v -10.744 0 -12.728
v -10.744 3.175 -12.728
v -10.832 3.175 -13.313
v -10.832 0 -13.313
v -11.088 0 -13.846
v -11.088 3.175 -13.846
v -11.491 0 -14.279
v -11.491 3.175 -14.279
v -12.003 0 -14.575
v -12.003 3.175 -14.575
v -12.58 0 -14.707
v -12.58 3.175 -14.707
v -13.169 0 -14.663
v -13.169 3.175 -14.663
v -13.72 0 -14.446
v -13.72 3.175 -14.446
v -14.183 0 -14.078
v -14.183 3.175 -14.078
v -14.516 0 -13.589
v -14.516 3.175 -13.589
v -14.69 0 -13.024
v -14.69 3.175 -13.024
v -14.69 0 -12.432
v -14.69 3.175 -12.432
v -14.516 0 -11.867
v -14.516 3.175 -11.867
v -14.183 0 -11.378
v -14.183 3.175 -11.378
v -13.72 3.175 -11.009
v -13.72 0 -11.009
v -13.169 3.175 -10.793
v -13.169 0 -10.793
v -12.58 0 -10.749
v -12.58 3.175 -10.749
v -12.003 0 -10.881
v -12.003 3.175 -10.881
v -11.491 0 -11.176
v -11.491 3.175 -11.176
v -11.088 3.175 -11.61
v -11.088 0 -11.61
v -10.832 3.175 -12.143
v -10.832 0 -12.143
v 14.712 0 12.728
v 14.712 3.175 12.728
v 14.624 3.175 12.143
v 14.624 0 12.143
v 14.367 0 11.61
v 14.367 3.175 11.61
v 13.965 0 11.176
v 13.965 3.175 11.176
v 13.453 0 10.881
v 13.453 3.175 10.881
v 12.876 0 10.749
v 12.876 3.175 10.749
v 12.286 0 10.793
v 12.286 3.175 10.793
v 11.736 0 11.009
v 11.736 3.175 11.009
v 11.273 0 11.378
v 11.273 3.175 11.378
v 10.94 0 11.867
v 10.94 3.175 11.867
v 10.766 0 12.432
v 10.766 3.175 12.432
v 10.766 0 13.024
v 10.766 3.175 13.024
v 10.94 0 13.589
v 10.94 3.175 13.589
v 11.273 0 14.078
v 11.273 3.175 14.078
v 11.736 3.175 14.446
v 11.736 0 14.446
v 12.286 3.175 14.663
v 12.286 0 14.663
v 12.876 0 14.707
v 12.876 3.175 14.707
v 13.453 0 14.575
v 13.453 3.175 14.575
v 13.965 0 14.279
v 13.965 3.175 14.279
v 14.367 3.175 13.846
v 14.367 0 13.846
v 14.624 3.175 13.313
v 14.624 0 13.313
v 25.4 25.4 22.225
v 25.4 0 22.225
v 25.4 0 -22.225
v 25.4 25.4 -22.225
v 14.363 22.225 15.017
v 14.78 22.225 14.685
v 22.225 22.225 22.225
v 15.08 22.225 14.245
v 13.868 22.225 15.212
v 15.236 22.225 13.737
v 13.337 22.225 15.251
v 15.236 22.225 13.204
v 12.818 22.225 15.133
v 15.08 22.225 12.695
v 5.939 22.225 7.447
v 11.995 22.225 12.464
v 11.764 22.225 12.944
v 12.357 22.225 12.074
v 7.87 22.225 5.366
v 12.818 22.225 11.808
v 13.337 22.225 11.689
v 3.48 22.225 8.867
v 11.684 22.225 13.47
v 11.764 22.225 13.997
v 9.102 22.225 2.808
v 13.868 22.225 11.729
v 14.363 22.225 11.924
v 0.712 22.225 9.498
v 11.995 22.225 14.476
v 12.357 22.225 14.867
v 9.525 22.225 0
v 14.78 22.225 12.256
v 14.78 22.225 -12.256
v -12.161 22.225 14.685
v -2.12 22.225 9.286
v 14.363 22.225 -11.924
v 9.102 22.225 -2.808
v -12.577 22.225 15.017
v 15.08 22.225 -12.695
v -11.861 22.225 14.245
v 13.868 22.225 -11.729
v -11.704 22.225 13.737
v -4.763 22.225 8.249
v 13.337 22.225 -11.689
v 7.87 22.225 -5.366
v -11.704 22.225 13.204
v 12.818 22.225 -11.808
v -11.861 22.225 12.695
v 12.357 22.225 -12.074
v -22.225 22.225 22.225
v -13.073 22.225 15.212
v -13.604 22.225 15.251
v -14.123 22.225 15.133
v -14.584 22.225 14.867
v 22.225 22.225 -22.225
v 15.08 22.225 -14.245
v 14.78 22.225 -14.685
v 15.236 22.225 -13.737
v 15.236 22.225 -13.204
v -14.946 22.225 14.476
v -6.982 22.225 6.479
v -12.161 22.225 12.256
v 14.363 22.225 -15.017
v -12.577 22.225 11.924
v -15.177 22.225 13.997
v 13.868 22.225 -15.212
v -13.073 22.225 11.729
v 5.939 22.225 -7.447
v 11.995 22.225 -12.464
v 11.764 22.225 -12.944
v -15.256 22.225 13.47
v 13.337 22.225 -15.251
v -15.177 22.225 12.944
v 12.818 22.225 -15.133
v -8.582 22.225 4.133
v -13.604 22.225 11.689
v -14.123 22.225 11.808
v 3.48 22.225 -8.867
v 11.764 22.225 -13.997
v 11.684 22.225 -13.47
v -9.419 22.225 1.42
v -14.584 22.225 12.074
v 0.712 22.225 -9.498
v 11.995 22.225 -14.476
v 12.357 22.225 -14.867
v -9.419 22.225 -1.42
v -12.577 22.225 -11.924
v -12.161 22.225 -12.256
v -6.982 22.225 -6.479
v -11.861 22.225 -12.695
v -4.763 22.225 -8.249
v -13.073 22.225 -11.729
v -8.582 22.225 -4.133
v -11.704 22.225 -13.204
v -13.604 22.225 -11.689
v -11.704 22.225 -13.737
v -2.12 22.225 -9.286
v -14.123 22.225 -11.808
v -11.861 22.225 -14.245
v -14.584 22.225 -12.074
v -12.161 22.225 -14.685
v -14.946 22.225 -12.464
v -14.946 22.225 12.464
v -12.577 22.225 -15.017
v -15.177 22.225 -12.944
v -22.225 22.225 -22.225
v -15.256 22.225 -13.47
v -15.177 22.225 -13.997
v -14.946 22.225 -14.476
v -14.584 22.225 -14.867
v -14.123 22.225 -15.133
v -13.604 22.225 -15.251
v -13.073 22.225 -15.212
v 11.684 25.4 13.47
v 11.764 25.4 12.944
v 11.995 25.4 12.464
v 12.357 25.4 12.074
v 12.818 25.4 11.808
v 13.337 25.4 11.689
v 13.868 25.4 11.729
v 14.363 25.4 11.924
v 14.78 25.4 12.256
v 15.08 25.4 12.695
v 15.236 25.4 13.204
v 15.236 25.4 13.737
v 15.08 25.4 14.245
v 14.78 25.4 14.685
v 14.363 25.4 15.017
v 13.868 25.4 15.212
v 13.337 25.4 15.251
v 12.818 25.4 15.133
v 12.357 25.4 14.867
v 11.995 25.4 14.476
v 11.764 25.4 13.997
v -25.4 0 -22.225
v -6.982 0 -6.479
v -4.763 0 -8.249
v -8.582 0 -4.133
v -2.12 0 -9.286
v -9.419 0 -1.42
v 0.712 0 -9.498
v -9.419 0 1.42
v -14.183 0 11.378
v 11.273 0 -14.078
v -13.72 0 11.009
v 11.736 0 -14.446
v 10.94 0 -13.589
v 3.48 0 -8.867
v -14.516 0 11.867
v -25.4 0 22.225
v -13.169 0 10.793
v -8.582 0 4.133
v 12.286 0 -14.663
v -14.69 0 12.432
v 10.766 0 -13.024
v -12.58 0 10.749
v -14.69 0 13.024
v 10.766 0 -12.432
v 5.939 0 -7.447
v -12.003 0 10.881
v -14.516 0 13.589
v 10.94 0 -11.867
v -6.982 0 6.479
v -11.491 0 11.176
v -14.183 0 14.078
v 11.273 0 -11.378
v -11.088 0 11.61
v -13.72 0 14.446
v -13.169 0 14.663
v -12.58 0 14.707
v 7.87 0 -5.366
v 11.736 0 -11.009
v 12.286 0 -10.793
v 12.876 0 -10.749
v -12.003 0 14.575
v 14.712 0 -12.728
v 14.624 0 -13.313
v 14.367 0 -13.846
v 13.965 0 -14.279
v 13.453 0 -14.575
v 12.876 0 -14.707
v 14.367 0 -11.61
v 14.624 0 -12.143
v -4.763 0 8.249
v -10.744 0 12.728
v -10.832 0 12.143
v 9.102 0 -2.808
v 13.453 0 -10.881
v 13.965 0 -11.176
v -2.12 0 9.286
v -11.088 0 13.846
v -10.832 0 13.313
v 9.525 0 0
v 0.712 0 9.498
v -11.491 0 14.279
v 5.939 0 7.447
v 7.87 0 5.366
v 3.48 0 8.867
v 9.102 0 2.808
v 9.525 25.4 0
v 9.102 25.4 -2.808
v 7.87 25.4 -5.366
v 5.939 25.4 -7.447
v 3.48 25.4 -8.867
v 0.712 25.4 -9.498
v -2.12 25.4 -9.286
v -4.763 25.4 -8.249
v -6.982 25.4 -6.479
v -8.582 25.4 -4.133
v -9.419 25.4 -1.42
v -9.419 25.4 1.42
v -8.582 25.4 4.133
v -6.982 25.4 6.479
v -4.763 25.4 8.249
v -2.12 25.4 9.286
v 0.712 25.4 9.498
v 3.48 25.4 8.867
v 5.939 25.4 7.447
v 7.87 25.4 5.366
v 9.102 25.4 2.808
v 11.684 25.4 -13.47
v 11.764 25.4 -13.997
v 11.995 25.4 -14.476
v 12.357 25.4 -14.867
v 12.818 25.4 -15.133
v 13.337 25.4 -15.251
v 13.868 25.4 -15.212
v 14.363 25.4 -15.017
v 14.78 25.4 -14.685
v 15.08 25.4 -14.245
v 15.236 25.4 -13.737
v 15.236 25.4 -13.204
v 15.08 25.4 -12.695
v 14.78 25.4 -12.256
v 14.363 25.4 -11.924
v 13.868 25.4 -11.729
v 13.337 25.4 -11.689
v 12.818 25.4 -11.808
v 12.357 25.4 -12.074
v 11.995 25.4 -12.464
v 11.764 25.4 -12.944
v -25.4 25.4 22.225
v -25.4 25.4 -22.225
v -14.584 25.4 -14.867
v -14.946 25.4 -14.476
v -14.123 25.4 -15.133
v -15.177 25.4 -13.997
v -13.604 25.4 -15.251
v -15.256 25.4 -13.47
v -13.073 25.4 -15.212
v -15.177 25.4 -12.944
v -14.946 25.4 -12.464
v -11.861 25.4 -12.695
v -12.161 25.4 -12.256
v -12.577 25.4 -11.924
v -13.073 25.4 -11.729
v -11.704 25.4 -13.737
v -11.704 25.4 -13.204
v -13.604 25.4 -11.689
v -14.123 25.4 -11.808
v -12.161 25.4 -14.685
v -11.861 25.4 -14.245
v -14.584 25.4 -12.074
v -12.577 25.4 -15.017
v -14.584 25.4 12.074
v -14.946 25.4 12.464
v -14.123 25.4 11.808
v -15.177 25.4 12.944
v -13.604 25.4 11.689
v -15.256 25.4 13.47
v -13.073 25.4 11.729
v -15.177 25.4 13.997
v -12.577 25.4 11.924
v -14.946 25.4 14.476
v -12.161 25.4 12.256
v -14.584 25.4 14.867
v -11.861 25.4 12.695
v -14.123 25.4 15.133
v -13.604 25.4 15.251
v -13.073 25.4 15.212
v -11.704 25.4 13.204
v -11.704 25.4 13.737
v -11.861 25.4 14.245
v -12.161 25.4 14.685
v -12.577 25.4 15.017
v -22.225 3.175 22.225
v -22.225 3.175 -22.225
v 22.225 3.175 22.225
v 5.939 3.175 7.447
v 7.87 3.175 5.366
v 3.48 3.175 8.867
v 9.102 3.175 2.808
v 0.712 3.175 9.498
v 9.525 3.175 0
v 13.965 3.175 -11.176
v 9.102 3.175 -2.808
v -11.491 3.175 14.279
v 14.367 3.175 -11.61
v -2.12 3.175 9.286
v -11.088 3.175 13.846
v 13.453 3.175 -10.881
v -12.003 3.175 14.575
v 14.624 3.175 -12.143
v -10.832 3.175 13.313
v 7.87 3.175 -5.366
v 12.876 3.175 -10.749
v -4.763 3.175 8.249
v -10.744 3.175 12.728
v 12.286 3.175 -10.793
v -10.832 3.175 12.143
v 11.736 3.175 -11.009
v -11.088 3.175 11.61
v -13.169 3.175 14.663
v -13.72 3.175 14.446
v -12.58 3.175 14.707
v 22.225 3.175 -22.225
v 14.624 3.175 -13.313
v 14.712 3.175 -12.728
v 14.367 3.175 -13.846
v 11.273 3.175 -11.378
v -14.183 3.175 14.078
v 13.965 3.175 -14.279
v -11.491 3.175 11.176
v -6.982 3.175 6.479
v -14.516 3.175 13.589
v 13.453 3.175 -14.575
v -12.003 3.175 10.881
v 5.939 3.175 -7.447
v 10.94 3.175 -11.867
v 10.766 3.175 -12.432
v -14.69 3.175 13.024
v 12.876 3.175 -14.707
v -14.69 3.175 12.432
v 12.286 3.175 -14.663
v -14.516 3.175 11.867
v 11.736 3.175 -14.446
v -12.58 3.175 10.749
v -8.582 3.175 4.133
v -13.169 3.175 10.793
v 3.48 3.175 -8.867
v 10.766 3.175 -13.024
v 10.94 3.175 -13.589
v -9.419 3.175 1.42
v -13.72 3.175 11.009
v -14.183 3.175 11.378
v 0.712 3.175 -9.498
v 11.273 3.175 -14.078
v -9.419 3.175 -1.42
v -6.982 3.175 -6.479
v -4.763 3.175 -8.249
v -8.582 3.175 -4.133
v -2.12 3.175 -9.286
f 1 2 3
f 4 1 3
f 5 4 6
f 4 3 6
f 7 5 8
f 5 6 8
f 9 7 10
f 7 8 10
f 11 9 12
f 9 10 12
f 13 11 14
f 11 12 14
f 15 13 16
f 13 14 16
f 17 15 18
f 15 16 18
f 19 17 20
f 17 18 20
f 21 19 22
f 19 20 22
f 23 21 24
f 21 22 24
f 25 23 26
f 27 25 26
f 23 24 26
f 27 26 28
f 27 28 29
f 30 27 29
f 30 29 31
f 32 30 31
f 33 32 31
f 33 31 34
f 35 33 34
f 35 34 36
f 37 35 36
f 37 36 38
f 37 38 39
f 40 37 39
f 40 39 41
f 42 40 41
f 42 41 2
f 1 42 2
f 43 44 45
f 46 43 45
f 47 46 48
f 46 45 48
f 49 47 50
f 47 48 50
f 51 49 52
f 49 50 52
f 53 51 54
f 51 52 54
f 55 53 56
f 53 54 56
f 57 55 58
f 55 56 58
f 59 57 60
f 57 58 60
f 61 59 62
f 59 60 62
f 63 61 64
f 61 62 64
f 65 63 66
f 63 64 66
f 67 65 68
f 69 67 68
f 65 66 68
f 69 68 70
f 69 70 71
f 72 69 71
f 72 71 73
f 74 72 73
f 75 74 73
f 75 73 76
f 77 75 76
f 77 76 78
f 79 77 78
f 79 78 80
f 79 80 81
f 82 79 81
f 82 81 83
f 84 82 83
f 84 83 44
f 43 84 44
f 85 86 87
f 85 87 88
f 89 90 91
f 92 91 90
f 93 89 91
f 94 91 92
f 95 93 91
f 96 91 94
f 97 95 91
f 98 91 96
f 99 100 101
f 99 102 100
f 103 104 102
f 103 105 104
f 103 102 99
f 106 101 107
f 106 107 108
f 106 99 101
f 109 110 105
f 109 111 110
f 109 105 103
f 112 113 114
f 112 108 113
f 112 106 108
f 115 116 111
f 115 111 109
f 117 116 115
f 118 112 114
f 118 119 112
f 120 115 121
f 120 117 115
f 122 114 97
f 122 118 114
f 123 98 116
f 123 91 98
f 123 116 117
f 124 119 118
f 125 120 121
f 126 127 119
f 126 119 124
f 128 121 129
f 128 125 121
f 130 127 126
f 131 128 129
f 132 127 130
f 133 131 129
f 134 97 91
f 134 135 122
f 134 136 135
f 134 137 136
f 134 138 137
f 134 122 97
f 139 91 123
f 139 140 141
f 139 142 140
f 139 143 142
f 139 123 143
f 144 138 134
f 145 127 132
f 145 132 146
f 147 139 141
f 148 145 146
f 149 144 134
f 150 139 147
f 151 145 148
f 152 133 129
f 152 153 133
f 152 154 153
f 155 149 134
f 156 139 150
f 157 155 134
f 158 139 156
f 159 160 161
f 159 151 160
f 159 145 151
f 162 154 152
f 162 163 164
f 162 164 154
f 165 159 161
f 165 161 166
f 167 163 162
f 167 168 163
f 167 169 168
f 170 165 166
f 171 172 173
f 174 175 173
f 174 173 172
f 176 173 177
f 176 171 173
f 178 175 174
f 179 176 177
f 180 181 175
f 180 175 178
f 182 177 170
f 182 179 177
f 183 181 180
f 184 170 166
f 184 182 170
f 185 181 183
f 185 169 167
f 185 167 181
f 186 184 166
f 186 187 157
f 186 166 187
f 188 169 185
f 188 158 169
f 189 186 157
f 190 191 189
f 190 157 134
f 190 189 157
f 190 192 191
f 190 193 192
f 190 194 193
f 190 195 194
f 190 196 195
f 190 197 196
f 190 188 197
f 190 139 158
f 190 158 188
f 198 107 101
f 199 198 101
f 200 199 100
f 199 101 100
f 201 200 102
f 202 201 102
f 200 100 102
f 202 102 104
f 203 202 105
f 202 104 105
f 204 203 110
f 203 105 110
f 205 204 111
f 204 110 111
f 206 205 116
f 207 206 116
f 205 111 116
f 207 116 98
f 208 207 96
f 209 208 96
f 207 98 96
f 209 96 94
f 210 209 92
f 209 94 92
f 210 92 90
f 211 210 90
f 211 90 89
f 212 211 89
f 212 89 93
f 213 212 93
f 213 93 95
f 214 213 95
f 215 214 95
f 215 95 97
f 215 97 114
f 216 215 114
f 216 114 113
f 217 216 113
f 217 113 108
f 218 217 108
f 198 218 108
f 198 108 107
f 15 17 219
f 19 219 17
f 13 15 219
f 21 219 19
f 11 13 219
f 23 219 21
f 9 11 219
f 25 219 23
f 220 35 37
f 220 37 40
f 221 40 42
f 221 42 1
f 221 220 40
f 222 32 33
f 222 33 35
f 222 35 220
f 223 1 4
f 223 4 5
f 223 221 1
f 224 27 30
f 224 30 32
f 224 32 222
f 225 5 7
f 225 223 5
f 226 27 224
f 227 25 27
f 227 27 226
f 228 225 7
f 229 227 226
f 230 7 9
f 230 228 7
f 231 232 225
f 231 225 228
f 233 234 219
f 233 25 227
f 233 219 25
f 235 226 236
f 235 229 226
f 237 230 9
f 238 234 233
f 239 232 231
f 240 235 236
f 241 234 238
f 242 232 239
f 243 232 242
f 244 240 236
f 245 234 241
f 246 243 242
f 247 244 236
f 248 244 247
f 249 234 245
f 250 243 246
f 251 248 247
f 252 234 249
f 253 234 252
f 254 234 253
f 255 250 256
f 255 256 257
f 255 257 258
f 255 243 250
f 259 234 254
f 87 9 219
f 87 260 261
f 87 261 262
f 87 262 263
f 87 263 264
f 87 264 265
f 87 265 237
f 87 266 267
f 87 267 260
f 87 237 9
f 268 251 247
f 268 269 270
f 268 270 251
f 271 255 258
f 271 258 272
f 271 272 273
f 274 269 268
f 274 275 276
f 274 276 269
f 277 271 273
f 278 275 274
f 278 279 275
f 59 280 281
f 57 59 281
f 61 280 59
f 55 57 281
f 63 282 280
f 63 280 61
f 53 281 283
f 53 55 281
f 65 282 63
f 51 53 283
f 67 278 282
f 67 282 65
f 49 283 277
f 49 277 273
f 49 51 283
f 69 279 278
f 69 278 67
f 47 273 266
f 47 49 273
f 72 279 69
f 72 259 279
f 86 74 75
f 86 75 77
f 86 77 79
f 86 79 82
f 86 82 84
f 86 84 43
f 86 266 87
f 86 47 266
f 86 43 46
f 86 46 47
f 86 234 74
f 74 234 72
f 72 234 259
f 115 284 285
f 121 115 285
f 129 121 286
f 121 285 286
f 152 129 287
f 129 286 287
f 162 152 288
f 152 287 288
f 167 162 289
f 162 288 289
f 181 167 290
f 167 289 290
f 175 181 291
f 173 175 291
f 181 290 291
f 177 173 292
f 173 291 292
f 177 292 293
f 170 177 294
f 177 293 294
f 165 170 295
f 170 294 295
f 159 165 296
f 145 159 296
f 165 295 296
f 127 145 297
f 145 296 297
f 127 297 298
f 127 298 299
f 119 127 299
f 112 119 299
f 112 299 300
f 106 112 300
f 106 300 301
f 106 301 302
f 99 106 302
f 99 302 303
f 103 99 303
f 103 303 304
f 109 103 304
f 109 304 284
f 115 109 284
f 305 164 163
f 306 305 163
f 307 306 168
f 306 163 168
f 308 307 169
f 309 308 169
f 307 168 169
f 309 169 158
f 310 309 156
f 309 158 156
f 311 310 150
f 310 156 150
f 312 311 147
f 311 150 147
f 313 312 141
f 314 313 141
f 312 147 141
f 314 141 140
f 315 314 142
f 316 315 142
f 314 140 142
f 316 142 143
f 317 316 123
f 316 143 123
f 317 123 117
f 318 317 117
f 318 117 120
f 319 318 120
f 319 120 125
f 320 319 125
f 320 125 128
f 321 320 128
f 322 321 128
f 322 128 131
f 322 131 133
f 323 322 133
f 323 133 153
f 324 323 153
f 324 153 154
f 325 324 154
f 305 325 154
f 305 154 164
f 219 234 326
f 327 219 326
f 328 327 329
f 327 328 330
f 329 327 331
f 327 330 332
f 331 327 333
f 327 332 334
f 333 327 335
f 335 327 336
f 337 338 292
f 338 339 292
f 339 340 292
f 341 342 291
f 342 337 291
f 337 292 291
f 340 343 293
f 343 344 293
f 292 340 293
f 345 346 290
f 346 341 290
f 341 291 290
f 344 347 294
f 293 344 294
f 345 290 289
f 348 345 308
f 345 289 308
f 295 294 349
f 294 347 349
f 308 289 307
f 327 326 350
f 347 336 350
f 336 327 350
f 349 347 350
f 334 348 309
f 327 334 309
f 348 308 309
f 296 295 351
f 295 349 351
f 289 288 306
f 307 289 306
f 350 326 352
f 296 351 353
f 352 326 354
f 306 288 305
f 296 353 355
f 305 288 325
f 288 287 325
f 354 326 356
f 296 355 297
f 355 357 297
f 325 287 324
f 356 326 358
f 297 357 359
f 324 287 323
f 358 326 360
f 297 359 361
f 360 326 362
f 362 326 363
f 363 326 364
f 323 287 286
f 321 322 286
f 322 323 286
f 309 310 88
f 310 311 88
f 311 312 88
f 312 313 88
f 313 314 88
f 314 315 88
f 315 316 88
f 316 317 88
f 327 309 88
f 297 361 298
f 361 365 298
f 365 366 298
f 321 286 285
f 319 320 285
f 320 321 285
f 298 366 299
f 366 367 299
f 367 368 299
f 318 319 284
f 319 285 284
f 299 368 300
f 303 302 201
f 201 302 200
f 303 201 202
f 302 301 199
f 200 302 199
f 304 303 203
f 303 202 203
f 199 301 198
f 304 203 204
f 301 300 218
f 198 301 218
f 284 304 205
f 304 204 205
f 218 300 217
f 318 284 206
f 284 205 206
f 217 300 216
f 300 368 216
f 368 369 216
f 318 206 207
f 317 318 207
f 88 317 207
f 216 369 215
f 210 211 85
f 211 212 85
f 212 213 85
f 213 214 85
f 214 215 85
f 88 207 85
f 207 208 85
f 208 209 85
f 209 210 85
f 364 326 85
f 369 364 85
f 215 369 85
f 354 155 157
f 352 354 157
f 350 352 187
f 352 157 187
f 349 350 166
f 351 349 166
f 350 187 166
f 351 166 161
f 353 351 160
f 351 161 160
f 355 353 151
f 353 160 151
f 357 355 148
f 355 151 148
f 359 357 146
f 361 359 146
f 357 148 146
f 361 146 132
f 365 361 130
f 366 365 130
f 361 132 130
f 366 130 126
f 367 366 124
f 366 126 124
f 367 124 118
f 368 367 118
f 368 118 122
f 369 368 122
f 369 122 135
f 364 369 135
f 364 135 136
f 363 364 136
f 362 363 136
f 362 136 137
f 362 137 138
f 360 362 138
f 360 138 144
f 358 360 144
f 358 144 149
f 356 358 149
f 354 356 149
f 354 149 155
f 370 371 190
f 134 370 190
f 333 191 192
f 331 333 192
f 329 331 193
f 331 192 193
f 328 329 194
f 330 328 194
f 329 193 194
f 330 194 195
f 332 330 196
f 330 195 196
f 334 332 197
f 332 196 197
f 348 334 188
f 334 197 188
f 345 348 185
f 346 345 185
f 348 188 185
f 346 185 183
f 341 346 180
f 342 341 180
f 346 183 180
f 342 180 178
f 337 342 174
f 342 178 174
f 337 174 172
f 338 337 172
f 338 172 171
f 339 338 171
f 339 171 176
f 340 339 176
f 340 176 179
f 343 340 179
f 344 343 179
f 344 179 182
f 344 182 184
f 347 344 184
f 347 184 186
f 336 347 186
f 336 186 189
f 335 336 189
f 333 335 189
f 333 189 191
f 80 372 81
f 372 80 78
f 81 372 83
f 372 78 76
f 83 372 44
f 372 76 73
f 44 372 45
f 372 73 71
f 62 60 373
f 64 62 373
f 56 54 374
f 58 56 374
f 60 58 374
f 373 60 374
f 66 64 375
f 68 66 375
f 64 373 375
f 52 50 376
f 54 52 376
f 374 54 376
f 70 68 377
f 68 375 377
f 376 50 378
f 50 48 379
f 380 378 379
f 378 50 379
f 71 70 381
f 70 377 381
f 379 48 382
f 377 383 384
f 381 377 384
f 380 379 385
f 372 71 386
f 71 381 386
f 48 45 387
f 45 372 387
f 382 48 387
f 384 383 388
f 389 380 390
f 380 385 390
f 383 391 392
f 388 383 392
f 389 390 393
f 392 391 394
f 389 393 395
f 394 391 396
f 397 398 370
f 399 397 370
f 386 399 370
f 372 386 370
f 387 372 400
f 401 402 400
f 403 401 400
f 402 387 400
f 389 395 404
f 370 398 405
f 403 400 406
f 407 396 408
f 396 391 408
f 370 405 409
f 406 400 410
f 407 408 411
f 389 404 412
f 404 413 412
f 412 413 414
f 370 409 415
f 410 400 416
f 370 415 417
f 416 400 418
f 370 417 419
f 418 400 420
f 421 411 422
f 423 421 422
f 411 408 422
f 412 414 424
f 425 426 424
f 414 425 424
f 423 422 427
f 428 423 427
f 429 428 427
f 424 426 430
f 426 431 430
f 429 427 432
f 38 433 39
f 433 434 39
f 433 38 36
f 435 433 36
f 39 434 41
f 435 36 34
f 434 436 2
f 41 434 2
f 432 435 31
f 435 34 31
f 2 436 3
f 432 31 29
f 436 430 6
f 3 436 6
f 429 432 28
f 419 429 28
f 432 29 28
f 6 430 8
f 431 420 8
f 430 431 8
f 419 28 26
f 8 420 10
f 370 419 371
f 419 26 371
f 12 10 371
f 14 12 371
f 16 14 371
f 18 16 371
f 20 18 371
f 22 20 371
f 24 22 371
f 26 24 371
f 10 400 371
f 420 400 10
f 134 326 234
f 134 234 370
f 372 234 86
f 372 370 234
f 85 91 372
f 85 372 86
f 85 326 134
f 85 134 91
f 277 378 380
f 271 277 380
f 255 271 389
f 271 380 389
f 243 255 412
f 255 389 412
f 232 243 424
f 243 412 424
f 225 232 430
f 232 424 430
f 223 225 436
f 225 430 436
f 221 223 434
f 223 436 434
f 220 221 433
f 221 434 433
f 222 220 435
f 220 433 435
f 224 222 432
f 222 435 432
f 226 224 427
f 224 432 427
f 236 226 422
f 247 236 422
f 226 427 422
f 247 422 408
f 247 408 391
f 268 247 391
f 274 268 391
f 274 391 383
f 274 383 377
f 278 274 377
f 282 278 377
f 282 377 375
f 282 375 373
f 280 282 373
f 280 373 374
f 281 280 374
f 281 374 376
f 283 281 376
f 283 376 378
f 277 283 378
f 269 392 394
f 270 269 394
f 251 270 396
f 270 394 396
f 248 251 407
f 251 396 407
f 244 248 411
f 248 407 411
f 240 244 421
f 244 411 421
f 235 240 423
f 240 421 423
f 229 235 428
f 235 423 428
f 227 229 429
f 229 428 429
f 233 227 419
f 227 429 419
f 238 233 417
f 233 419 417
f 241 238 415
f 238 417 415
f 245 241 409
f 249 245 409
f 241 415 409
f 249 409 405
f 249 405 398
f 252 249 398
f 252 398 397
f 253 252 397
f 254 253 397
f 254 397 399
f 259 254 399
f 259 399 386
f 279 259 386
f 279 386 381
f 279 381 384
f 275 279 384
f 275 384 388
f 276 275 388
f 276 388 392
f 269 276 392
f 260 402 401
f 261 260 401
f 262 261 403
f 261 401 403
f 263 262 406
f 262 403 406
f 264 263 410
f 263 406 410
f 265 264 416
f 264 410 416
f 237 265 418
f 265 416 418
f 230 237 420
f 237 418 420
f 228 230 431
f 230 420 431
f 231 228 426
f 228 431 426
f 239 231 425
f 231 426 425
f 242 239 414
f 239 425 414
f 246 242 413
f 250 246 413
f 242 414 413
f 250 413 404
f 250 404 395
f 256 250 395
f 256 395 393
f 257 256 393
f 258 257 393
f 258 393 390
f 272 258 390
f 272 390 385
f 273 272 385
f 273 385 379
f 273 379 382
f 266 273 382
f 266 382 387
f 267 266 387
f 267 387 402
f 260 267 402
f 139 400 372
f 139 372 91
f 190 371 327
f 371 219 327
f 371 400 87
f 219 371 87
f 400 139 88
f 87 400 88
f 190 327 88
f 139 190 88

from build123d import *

# Parameters (mm, degrees)
SKETCH1_W                           = 50.8
SKETCH1_H                           = 25.4
BOSS_EXTRUDE1_DEPTH                 = 22.225
SKETCH2_R                           = 9.525
CUT_EXTRUDE1_DEPTH                  = 26.4
SKETCH4_W                           = 44.45
SKETCH4_H                           = 19.05
CUT_EXTRUDE3_DEPTH                  = 45.45
F_9_64_0_14063_DIAMETER_HOLE2_D     = 3.572002
F_9_64_0_14063_DIAMETER_HOLE2_DEPTH = 3.175
F_5_32_0_15625_DIAMETER_HOLE1_D     = 3.96875
F_5_32_0_15625_DIAMETER_HOLE1_DEPTH = 3.175


with BuildPart() as part:
    # Sketch1 → Boss-Extrude1 (new body, symmetric)
    with BuildSketch(Plane.XY):
        with Locations((0, 12.7)):
            Rectangle(SKETCH1_W, SKETCH1_H)
    extrude(amount=BOSS_EXTRUDE1_DEPTH, both=True)

    # Sketch2 → Cut-Extrude1 (cut, through all)
    with BuildSketch(Plane(origin=(0, 25.4, 0), x_dir=(1, 0, 0), z_dir=(0, 1, 0))):
        Circle(SKETCH2_R)
    extrude(amount=-CUT_EXTRUDE1_DEPTH, mode=Mode.SUBTRACT)

    # Sketch4 → Cut-Extrude3 (cut, through all)
    with BuildSketch(Plane(origin=(0, 0, -22.225), x_dir=(-1, 0, 0), z_dir=(0, 0, -1))):
        with Locations((0, 12.7)):
            Rectangle(SKETCH4_W, SKETCH4_H)
    extrude(amount=-CUT_EXTRUDE3_DEPTH, mode=Mode.SUBTRACT)

    # 9/64 (0.14063) Diameter Hole2
    with Locations(Plane(origin=(0, 25.4, 0), x_dir=(1, 0, 0), z_dir=(0, 1, 0))):
        with Locations((-13.470384182, 13.470384182), (13.470384182, 13.470384182), (13.470384182, -13.470384182), (-13.470384182, -13.470384182)):
            Hole(F_9_64_0_14063_DIAMETER_HOLE2_D / 2, depth=F_9_64_0_14063_DIAMETER_HOLE2_DEPTH)

    # 5/32 (0.15625) Diameter Hole1
    with Locations(Plane(origin=(0, 0, 0), x_dir=(-1, 0, 0), z_dir=(0, -1, 0))):
        with Locations((-12.727922061, 12.727922061), (12.727922061, 12.727922061), (12.727922061, -12.727922061), (-12.727922061, -12.727922061)):
            Hole(F_5_32_0_15625_DIAMETER_HOLE1_D / 2, depth=F_5_32_0_15625_DIAMETER_HOLE1_DEPTH)


solid = part.part
